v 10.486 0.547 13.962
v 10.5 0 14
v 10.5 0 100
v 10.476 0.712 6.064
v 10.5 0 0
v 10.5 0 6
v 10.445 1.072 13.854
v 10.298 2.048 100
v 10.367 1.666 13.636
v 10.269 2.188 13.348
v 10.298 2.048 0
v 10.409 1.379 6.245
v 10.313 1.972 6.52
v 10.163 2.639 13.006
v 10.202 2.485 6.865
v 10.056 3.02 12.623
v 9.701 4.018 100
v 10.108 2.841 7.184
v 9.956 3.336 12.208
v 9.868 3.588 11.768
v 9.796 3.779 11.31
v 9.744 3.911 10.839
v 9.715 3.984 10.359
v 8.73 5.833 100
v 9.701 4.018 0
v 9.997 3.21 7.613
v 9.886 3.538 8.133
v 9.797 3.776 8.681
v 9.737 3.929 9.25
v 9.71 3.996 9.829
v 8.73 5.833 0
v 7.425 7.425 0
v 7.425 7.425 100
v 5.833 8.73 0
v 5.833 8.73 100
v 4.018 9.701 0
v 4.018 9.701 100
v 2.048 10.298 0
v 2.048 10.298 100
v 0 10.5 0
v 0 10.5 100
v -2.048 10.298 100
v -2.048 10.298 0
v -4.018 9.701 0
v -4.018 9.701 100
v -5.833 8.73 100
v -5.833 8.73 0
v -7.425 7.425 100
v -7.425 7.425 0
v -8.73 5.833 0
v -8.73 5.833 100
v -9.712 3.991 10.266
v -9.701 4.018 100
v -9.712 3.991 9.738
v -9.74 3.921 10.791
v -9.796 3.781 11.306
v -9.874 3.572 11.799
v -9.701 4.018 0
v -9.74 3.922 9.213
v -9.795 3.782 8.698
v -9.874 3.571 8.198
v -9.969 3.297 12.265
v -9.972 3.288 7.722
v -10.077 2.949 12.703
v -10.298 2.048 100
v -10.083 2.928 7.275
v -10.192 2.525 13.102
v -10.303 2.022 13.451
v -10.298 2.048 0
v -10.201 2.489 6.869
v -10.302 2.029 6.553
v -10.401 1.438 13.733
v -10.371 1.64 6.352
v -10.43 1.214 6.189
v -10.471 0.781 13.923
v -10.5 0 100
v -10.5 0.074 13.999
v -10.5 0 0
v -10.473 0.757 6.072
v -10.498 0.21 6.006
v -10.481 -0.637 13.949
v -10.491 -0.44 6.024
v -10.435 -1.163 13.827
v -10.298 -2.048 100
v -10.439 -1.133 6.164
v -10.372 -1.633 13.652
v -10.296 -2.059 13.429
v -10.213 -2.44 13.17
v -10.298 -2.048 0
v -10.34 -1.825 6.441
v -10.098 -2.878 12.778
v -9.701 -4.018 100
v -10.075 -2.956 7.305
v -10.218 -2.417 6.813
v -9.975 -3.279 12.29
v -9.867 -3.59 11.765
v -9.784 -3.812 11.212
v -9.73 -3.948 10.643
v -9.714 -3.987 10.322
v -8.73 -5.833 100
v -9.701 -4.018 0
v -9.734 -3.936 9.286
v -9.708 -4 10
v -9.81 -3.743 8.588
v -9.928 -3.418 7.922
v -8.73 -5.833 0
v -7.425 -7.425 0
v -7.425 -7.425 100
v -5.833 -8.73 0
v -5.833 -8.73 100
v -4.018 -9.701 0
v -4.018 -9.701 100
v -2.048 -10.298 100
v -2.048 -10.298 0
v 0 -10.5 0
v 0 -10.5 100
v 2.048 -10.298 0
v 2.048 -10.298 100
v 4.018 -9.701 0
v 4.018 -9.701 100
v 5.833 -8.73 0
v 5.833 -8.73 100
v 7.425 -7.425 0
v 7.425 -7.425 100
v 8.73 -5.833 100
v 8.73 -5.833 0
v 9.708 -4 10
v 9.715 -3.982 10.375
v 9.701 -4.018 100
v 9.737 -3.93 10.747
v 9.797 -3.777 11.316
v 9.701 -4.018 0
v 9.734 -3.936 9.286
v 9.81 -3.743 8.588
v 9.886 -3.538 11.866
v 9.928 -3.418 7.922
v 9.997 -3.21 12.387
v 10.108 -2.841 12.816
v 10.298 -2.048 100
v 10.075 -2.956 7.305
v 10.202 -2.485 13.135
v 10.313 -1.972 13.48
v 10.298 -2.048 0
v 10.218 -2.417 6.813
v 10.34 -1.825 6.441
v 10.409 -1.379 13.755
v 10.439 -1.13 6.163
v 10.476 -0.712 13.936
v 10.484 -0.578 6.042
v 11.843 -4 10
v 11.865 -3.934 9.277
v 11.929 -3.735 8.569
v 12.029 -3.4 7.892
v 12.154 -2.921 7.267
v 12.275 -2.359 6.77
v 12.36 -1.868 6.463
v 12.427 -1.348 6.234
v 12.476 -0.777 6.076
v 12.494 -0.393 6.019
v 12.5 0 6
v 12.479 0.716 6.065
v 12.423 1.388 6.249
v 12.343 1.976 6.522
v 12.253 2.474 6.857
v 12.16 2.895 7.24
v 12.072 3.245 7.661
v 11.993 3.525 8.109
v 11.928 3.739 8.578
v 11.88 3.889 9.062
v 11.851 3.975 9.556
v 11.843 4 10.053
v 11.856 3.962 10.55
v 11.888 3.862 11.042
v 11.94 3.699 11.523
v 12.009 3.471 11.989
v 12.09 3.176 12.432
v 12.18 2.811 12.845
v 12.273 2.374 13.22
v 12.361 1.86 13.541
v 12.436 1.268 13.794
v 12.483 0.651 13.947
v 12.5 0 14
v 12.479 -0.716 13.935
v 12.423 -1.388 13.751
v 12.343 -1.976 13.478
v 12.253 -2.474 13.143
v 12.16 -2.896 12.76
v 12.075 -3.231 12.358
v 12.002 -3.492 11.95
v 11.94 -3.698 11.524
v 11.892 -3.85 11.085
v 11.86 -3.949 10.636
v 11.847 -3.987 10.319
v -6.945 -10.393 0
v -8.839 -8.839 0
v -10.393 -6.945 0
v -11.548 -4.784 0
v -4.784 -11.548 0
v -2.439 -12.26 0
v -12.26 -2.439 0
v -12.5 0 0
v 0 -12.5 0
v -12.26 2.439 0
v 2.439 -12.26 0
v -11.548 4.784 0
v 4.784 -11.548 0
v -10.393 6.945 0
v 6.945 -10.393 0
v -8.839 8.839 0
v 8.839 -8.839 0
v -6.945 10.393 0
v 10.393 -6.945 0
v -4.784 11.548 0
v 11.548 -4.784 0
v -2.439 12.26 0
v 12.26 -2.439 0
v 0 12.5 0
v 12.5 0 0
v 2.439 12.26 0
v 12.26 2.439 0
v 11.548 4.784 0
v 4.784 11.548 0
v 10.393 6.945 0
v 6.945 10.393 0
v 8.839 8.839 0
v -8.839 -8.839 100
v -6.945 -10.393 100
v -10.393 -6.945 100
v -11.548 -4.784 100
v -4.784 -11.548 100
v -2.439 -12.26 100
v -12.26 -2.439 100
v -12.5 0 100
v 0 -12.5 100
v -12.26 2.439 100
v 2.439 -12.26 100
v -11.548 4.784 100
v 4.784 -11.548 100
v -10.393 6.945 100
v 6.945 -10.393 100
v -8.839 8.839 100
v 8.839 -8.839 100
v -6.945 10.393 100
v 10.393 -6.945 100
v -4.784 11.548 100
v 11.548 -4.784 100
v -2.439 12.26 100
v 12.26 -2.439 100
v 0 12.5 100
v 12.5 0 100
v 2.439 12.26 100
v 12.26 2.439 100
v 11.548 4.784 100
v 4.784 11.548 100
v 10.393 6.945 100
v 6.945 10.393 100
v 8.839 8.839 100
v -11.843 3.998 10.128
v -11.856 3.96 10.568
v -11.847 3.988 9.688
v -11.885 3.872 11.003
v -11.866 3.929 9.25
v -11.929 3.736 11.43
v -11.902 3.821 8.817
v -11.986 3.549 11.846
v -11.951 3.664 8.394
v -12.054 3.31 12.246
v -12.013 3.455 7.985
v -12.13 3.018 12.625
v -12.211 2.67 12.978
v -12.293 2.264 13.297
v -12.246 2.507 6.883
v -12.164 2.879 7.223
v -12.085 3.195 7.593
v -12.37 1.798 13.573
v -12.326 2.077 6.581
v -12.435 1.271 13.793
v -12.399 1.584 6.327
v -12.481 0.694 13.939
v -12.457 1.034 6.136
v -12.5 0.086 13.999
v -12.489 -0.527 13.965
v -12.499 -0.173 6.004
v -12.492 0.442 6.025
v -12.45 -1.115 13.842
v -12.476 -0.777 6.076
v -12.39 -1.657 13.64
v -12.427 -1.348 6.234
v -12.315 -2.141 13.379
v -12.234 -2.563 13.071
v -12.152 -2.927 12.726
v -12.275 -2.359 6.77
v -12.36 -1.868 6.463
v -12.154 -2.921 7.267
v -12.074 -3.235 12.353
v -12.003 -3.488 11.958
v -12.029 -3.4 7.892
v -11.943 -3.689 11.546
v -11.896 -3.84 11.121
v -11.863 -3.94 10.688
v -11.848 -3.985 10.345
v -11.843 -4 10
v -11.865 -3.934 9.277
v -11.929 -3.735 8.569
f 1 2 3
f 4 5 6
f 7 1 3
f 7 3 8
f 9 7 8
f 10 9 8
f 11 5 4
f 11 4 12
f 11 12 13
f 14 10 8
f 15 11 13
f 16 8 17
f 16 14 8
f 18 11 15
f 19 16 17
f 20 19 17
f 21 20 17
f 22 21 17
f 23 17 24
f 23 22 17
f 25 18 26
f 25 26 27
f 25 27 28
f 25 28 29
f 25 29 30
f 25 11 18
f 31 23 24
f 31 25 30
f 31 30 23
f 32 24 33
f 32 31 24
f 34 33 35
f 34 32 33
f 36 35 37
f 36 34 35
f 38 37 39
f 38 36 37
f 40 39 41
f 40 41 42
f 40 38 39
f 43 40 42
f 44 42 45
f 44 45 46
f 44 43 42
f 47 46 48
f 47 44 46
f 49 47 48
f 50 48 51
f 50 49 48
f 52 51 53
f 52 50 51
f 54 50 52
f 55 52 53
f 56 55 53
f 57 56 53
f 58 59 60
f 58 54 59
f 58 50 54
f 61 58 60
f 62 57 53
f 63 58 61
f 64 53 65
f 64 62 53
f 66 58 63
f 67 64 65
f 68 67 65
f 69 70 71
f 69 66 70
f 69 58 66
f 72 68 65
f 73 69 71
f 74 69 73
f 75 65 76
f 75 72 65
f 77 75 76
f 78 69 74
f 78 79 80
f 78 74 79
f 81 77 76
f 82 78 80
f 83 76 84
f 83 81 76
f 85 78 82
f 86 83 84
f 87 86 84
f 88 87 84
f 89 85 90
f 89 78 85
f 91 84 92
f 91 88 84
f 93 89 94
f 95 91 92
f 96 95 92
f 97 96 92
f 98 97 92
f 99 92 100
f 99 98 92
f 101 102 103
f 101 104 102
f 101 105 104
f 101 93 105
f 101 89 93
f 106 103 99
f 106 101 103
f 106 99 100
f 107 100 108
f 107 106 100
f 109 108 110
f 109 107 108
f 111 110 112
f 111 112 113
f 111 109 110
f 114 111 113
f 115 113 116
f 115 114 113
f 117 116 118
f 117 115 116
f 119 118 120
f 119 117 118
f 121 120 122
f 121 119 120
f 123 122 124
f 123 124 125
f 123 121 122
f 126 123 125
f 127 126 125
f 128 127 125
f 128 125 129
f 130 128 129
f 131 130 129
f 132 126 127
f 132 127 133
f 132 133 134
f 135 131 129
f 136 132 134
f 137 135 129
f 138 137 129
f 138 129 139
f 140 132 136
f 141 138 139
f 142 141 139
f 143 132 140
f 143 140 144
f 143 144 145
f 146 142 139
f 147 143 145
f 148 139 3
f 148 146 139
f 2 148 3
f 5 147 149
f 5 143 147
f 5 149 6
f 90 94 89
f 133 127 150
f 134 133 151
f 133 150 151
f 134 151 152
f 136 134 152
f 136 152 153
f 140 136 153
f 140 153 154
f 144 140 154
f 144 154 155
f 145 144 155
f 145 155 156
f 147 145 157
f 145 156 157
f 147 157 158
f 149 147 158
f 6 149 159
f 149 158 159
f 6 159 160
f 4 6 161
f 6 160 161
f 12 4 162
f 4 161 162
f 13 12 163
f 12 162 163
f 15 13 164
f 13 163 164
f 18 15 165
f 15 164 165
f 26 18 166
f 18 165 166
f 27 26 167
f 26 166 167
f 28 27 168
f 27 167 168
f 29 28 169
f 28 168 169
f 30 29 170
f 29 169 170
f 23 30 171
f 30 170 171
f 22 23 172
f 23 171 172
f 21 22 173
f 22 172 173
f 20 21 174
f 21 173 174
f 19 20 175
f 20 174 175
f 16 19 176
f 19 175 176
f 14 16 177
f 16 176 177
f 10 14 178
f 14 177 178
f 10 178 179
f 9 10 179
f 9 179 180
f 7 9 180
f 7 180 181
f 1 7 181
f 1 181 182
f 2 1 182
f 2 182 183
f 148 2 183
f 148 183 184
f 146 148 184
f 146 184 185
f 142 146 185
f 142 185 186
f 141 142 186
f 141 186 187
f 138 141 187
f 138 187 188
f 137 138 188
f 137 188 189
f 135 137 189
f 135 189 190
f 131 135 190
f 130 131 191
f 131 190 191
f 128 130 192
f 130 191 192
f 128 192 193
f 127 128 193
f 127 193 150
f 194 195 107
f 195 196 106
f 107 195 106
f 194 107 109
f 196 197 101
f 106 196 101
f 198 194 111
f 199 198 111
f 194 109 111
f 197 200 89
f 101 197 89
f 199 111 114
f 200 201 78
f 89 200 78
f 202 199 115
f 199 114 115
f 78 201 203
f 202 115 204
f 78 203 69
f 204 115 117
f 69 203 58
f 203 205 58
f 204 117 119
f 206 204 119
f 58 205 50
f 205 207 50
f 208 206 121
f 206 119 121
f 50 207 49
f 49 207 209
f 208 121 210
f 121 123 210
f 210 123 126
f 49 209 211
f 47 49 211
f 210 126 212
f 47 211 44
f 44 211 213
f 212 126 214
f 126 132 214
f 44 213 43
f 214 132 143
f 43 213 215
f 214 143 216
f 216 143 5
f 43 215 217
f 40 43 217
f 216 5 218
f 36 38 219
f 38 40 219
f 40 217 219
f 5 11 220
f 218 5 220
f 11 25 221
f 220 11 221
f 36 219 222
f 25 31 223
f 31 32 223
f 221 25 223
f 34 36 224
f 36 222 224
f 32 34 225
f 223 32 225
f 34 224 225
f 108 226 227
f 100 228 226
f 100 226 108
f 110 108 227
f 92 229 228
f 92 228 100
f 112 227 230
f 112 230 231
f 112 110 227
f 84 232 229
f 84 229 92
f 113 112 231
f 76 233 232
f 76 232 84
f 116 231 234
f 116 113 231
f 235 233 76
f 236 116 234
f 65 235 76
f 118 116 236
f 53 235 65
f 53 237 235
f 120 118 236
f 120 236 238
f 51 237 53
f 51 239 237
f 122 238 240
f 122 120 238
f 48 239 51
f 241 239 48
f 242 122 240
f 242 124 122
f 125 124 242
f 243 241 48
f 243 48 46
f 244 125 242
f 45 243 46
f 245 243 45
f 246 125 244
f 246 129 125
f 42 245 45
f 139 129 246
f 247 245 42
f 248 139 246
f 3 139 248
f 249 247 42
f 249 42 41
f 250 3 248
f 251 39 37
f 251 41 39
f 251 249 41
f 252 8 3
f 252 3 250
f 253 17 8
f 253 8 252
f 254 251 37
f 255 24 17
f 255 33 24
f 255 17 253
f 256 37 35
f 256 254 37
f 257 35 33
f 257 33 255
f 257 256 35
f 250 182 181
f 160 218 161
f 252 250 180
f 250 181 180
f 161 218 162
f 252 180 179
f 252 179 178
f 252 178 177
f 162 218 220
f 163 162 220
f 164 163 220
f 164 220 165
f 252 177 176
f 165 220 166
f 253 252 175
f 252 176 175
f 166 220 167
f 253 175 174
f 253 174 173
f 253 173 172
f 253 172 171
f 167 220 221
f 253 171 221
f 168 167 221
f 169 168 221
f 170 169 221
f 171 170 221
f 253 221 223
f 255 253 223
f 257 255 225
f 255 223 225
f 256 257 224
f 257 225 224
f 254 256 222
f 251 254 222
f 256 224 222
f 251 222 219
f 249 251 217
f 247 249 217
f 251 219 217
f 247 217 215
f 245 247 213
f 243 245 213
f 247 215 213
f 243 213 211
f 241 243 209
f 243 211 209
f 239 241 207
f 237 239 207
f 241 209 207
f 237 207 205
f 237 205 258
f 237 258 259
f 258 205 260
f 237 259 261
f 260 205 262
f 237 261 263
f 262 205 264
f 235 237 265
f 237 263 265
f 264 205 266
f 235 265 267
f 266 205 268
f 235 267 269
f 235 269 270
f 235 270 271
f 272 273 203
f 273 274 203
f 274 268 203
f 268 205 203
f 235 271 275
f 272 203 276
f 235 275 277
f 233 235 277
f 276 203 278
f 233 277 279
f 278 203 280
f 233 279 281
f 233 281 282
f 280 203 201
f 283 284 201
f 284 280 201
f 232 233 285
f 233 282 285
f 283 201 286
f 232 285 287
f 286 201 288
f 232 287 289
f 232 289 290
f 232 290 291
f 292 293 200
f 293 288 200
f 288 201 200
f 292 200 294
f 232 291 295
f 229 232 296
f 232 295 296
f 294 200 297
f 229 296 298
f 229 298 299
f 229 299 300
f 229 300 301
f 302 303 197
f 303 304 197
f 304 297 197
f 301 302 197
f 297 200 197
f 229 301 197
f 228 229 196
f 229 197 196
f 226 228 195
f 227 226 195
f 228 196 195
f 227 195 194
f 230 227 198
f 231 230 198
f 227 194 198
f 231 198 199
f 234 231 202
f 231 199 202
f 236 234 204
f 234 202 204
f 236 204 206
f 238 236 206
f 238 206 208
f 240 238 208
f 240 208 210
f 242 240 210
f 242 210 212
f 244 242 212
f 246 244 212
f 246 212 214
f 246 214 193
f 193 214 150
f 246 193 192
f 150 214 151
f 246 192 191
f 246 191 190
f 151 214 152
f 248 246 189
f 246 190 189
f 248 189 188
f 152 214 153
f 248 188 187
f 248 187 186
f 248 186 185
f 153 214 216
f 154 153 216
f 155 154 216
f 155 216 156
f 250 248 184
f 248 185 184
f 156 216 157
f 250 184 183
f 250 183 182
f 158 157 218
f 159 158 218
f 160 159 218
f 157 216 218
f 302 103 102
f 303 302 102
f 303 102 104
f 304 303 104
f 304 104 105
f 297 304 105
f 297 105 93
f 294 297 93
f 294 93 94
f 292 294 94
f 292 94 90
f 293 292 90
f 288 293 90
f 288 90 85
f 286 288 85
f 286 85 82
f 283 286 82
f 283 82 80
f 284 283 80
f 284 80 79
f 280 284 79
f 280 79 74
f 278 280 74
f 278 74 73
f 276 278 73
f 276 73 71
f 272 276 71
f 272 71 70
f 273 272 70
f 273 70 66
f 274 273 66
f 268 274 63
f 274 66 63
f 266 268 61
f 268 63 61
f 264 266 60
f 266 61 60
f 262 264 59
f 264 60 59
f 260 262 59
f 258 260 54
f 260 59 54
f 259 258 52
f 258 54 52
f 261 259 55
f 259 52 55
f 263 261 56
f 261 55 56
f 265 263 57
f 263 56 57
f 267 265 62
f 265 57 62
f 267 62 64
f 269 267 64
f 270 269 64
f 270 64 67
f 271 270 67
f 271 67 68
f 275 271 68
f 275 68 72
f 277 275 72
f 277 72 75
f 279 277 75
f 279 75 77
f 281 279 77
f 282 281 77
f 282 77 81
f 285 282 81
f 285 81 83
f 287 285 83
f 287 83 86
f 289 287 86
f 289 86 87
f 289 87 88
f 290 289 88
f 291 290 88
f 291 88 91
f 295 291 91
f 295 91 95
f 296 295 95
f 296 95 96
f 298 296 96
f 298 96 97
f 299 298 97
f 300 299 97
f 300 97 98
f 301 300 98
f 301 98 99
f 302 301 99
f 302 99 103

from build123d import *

# Parameters (mm, degrees)
F0_R     = 12.5
F1_DEPTH = 100
F2_T     = -2
F5_D     = 8


with BuildPart() as f1:
    # F0 (on Top) → F1 (new body)
    with BuildSketch(Plane.XY):
        Circle(F0_R)
    extrude(amount=F1_DEPTH)

    # F2
    f2_openings = [f1.faces().sort_by_distance(p)[0] for p in [
        (0, 0, 100),
        (0, 0, 0),
    ]]
    offset(amount=F2_T, openings=f2_openings)

    # F5 (through all)
    with Locations(Plane(origin=(-30, 0, 0), x_dir=(0, 1, 0), z_dir=(-1, 0, 0))):
        with Locations((0, -10)):
            Hole(F5_D / 2)


solid = f1.part
